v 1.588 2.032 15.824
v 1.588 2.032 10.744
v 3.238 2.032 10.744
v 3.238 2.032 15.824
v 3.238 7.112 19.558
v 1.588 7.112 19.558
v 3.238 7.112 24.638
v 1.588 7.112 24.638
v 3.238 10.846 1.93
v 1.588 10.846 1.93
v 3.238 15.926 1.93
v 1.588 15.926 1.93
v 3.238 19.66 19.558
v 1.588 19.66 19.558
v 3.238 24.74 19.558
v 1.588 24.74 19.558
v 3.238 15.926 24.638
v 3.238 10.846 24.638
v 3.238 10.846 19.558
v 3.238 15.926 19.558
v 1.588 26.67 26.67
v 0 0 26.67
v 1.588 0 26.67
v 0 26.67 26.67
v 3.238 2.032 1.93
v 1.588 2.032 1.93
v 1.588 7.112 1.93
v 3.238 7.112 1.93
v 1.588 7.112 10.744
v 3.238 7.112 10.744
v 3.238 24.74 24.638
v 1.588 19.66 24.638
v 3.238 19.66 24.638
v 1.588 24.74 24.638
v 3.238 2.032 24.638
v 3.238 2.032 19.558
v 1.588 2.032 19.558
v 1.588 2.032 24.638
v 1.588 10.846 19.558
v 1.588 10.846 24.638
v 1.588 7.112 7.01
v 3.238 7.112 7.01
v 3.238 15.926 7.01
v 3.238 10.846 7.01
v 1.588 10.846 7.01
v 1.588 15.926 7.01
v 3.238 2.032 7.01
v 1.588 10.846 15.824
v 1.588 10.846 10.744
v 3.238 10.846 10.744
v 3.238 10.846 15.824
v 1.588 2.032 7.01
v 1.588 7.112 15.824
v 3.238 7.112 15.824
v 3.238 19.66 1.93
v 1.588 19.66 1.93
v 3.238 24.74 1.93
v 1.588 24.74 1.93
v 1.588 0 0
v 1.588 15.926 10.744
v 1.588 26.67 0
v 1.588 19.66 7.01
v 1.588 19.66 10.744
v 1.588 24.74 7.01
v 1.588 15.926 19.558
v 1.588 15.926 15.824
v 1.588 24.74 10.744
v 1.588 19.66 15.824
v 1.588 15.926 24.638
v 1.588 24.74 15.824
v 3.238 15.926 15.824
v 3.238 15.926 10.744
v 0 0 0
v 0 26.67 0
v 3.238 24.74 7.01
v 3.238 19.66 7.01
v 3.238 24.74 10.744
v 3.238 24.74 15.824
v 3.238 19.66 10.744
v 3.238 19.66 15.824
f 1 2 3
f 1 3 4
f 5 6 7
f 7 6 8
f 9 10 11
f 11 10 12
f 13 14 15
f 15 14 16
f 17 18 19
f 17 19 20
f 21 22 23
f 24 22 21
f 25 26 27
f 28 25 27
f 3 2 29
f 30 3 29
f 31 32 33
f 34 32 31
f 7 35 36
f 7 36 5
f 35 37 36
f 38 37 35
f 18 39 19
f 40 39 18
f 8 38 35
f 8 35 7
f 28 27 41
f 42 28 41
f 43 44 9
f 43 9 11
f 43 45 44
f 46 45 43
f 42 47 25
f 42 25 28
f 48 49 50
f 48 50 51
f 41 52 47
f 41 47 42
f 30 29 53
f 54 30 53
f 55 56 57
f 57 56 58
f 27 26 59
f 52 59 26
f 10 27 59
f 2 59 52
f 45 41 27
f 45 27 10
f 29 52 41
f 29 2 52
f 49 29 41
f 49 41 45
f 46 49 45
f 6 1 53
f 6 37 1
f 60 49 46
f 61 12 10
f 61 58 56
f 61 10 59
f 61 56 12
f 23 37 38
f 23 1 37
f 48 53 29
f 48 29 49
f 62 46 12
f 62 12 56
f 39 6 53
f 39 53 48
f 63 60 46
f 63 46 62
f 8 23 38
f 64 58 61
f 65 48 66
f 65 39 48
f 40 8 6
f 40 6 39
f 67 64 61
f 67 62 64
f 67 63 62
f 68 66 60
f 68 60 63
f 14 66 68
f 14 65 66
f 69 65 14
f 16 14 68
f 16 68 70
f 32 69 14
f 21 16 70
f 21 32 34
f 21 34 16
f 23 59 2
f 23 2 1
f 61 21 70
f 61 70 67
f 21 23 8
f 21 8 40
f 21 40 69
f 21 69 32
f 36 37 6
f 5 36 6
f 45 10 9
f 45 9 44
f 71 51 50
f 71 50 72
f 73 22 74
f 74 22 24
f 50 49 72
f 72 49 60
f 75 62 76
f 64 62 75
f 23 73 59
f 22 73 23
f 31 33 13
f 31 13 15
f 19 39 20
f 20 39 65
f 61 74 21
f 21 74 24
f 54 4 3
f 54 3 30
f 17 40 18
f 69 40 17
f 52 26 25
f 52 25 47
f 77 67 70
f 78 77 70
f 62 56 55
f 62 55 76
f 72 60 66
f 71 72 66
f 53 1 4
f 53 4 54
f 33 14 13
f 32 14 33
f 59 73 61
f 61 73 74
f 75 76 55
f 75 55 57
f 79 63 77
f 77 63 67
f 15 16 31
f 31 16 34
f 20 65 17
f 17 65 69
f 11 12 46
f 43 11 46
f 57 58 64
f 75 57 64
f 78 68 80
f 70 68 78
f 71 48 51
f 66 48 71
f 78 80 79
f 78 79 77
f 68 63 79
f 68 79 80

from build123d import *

# Parameters (mm, degrees)
F0_W     = 26.67
F0_H     = 26.67
F1_DEPTH = 1.5875
F2_W     = 5.08
F2_H     = 5.08
F3_DEPTH = 1.651


with BuildPart() as f1:
    # F0 (on Right) → F1 (new body)
    with BuildSketch(Plane.YZ):
        with Locations((13.335, 13.335)):
            Rectangle(F0_W, F0_H)
    extrude(amount=F1_DEPTH)

    # F2 (on face) → F3 (join)
    with BuildSketch(Plane.YZ.offset(1.5875)):
        with Locations((4.572, 22.098)):
            Rectangle(F2_W, F2_H)
        with Locations((4.572, 13.2842)):
            Rectangle(F2_W, F2_H)
        with Locations((4.572, 4.4704)):
            Rectangle(F2_W, F2_H)
        with Locations((13.3858, 22.098)):
            Rectangle(F2_W, F2_H)
        with Locations((13.3858, 13.2842)):
            Rectangle(F2_W, F2_H)
        with Locations((13.3858, 4.4704)):
            Rectangle(F2_W, F2_H)
        with Locations((22.1996, 22.098)):
            Rectangle(F2_W, F2_H)
        with Locations((22.1996, 13.2842)):
            Rectangle(F2_W, F2_H)
        with Locations((22.1996, 4.4704)):
            Rectangle(F2_W, F2_H)
    extrude(amount=F3_DEPTH)


solid = f1.part
